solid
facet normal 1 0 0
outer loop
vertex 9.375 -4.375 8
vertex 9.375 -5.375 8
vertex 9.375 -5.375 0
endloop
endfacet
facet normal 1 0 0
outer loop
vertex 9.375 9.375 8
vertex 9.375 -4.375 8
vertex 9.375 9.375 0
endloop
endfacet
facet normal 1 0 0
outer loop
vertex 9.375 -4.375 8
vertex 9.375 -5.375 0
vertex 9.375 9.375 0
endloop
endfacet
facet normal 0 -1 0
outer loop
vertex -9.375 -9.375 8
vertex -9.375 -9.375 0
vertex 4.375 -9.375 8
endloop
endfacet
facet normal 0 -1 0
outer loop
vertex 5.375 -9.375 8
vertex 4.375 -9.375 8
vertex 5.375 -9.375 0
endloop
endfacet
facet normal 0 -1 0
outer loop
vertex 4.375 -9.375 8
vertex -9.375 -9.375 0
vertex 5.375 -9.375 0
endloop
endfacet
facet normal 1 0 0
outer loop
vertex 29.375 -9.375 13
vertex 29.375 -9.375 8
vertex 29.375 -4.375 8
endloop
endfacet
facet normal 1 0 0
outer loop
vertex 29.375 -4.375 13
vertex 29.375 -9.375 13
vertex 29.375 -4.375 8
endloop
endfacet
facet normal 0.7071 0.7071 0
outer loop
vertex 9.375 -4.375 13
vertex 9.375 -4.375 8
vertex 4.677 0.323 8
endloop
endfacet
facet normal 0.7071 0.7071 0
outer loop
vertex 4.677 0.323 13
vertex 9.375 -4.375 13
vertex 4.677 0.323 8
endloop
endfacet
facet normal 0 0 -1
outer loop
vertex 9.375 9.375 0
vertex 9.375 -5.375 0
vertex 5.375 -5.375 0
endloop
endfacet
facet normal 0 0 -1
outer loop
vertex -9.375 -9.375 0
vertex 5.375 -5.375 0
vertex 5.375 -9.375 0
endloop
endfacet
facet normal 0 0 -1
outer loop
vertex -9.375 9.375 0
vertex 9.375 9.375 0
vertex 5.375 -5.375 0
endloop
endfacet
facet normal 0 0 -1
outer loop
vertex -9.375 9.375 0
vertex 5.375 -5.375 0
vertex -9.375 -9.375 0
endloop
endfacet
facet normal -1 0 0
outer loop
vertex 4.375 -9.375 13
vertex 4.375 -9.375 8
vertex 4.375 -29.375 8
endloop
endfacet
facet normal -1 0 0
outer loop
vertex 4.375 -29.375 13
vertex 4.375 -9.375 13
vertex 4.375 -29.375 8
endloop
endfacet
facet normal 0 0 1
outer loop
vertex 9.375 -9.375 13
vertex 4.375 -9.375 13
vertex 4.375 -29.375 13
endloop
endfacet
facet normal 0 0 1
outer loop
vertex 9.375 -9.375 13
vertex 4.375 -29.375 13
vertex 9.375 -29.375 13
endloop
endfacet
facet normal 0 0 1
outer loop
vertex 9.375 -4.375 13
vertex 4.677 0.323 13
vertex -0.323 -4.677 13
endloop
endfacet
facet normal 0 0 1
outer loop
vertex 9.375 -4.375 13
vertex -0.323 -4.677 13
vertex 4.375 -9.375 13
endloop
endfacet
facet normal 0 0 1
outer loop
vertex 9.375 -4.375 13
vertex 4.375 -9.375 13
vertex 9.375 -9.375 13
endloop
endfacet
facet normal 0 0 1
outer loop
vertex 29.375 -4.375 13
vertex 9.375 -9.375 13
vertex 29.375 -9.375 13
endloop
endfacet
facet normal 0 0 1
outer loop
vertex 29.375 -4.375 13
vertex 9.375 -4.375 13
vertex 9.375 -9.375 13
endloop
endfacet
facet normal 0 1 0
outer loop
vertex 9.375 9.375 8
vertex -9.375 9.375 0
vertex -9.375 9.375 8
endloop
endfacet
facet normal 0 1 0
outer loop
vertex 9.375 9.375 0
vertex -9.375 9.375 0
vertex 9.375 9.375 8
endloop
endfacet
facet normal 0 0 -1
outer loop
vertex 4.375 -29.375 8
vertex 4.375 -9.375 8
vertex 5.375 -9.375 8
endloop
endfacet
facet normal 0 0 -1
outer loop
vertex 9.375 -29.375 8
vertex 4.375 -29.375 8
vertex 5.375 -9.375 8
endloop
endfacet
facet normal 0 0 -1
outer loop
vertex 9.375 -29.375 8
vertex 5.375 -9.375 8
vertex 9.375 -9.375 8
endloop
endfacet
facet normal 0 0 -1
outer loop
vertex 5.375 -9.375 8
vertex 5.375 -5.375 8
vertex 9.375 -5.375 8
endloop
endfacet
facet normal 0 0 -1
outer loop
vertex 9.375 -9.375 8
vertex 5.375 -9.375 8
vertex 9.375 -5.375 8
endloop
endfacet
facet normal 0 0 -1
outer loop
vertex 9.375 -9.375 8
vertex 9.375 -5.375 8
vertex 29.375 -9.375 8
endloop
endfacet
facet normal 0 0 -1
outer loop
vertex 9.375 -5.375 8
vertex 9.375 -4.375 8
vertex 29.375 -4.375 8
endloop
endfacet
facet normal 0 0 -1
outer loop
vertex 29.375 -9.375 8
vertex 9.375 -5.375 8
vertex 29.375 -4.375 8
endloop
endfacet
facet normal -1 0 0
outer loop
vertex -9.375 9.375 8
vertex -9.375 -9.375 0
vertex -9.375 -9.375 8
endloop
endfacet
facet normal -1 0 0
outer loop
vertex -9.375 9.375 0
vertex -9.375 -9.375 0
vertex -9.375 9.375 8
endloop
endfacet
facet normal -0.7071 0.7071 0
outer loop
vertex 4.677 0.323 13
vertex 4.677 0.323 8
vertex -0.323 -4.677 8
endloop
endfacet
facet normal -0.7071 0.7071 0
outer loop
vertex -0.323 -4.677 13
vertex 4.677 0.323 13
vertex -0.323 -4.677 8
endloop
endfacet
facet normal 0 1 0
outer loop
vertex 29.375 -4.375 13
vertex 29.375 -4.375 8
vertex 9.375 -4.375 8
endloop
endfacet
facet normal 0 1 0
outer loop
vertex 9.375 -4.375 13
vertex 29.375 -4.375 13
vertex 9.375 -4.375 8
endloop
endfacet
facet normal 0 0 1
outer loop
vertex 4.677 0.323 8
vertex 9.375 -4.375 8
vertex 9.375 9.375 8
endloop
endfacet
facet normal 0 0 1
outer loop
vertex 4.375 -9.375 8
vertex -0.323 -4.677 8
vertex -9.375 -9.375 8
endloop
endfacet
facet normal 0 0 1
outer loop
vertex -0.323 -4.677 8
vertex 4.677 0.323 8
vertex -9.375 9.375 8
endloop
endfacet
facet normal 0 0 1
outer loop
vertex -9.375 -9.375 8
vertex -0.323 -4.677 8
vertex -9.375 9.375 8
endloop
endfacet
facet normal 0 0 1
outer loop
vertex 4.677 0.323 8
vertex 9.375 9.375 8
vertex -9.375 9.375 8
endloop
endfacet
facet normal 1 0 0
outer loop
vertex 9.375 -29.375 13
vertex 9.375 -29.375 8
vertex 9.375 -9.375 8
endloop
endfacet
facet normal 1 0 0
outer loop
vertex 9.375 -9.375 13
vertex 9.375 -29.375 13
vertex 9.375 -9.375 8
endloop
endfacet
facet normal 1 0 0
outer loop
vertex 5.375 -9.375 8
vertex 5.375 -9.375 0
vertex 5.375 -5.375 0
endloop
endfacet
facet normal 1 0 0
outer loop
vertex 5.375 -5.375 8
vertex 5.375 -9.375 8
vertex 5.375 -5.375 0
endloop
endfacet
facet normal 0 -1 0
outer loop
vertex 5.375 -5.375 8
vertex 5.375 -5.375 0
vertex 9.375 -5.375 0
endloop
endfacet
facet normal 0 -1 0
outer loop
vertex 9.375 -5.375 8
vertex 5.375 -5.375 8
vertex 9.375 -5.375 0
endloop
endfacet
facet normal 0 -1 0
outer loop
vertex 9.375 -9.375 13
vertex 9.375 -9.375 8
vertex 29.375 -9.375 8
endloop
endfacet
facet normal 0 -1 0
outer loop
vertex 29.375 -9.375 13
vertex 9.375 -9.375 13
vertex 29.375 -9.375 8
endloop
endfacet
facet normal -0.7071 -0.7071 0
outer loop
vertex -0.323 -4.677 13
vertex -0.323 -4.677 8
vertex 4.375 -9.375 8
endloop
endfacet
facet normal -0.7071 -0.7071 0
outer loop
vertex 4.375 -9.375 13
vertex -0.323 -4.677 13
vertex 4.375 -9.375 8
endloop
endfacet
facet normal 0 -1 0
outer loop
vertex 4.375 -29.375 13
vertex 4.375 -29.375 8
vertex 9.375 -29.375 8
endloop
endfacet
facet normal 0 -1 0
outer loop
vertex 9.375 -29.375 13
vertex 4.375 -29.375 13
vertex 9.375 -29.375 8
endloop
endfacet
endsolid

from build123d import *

# Parameters (mm, degrees)
BOSS_EXTRUDE1_DEPTH = 8
BOSS_EXTRUDE2_START = 8
BOSS_EXTRUDE2_DEPTH = 5
SKETCH5_W           = 4
SKETCH5_H           = 4
CUT_EXTRUDE1_DEPTH  = 8


with BuildPart() as part:
    # Sketch1 → Boss-Extrude1 (new body)
    with BuildSketch(Plane.XY):
        Polygon((9.375, -4.375), (9.375, -9.375), (4.375, -9.375), (-9.375, -9.375), (-9.375, 9.375), (9.375, 9.375), align=None)
    extrude(amount=BOSS_EXTRUDE1_DEPTH)

    # Sketch3 → Boss-Extrude2 (add)
    with BuildSketch(Plane.XY.offset(BOSS_EXTRUDE2_START)):
        Polygon((4.375, -9.375), (4.375, -29.375), (9.375, -29.375), (9.375, -9.375), (29.375, -9.375), (29.375, -4.375), (9.375, -4.375), (4.677094882, 0.322905118), (-0.322905118, -4.677094882), align=None)
    extrude(amount=BOSS_EXTRUDE2_DEPTH)

    # Sketch5 → Cut-Extrude1 (cut)
    with BuildSketch(Plane.XY):
        with Locations((7.375, -7.375)):
            Rectangle(SKETCH5_W, SKETCH5_H)
    extrude(amount=CUT_EXTRUDE1_DEPTH, mode=Mode.SUBTRACT)


solid = part.part
